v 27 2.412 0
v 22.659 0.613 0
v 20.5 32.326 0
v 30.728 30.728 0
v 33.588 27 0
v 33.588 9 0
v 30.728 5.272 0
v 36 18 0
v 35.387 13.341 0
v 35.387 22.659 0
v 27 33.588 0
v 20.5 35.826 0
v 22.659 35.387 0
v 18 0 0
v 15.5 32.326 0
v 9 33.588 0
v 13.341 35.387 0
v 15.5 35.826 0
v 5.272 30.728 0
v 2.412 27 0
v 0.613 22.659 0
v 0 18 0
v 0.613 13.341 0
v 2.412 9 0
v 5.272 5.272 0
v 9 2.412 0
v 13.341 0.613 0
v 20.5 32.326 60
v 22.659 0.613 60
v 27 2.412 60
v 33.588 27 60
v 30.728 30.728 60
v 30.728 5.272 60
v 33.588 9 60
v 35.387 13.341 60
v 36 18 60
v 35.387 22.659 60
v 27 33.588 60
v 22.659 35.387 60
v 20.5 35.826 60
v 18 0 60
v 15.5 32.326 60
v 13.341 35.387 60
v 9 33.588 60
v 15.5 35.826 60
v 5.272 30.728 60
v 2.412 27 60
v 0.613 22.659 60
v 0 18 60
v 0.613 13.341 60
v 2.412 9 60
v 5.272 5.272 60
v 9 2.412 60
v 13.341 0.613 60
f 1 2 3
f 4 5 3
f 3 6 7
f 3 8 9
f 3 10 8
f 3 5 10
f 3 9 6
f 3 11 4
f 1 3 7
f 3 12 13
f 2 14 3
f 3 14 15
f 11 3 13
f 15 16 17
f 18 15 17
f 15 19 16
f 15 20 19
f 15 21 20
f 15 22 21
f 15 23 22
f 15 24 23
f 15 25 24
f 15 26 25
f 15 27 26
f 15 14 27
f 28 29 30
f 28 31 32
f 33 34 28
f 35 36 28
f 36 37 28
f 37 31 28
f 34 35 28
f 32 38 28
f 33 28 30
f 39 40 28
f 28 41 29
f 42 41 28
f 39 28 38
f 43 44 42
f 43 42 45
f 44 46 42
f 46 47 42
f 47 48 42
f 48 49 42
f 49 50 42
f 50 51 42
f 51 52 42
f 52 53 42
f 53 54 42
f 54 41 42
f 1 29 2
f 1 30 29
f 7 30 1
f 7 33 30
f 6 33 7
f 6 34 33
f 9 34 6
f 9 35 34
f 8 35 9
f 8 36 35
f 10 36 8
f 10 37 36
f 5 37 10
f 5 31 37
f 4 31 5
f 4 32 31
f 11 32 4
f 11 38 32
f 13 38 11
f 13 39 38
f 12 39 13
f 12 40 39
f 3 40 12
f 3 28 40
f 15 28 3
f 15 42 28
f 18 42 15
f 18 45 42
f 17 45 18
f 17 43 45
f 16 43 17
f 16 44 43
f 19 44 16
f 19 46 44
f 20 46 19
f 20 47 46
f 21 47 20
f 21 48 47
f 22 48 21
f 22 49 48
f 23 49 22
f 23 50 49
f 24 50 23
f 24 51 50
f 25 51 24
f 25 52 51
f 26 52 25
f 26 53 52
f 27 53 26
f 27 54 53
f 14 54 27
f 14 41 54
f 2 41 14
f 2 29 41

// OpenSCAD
$fn = 32;

// ----------------------------------------------------------------------
// Keyway shaft: d36 shaft, key 5 x 3.5 mm
// ----------------------------------------------------------------------

// --- parameters (mm) ---
shaft_r = 18;             // shaft radius
key_w = 5;                // keyway width
key_d = 3.5;              // keyway depth below the surface line
plate_t = 60;             // shaft length, Z (extrusion height)
fit_tol = 0.02;           // declared fit tolerance (prompt contract)
free_tol = 0.2;           // declared free tolerance (prompt contract)

shaft_d = 2 * shaft_r;  // shaft diameter
circle_step = 15;  // polygon sampling step, degrees

profile = [[13.341, 35.387], [9, 33.588], [5.272, 30.728], [2.412, 27], [0.613, 22.659], [0, 18], [0.613, 13.341], [2.412, 9], [5.272, 5.272], [9, 2.412], [13.341, 0.613], [18, 0], [22.659, 0.613], [27, 2.412], [30.728, 5.272], [33.588, 9], [35.387, 13.341], [36, 18], [35.387, 22.659], [33.588, 27], [30.728, 30.728], [27, 33.588], [22.659, 35.387], [20.5, 35.826], [20.5, 32.326], [15.5, 32.326], [15.5, 35.826]];  // primary outline, 27 points, counter clockwise

// --- the one profile operation ---
linear_extrude(height = plate_t) polygon(points = profile);
